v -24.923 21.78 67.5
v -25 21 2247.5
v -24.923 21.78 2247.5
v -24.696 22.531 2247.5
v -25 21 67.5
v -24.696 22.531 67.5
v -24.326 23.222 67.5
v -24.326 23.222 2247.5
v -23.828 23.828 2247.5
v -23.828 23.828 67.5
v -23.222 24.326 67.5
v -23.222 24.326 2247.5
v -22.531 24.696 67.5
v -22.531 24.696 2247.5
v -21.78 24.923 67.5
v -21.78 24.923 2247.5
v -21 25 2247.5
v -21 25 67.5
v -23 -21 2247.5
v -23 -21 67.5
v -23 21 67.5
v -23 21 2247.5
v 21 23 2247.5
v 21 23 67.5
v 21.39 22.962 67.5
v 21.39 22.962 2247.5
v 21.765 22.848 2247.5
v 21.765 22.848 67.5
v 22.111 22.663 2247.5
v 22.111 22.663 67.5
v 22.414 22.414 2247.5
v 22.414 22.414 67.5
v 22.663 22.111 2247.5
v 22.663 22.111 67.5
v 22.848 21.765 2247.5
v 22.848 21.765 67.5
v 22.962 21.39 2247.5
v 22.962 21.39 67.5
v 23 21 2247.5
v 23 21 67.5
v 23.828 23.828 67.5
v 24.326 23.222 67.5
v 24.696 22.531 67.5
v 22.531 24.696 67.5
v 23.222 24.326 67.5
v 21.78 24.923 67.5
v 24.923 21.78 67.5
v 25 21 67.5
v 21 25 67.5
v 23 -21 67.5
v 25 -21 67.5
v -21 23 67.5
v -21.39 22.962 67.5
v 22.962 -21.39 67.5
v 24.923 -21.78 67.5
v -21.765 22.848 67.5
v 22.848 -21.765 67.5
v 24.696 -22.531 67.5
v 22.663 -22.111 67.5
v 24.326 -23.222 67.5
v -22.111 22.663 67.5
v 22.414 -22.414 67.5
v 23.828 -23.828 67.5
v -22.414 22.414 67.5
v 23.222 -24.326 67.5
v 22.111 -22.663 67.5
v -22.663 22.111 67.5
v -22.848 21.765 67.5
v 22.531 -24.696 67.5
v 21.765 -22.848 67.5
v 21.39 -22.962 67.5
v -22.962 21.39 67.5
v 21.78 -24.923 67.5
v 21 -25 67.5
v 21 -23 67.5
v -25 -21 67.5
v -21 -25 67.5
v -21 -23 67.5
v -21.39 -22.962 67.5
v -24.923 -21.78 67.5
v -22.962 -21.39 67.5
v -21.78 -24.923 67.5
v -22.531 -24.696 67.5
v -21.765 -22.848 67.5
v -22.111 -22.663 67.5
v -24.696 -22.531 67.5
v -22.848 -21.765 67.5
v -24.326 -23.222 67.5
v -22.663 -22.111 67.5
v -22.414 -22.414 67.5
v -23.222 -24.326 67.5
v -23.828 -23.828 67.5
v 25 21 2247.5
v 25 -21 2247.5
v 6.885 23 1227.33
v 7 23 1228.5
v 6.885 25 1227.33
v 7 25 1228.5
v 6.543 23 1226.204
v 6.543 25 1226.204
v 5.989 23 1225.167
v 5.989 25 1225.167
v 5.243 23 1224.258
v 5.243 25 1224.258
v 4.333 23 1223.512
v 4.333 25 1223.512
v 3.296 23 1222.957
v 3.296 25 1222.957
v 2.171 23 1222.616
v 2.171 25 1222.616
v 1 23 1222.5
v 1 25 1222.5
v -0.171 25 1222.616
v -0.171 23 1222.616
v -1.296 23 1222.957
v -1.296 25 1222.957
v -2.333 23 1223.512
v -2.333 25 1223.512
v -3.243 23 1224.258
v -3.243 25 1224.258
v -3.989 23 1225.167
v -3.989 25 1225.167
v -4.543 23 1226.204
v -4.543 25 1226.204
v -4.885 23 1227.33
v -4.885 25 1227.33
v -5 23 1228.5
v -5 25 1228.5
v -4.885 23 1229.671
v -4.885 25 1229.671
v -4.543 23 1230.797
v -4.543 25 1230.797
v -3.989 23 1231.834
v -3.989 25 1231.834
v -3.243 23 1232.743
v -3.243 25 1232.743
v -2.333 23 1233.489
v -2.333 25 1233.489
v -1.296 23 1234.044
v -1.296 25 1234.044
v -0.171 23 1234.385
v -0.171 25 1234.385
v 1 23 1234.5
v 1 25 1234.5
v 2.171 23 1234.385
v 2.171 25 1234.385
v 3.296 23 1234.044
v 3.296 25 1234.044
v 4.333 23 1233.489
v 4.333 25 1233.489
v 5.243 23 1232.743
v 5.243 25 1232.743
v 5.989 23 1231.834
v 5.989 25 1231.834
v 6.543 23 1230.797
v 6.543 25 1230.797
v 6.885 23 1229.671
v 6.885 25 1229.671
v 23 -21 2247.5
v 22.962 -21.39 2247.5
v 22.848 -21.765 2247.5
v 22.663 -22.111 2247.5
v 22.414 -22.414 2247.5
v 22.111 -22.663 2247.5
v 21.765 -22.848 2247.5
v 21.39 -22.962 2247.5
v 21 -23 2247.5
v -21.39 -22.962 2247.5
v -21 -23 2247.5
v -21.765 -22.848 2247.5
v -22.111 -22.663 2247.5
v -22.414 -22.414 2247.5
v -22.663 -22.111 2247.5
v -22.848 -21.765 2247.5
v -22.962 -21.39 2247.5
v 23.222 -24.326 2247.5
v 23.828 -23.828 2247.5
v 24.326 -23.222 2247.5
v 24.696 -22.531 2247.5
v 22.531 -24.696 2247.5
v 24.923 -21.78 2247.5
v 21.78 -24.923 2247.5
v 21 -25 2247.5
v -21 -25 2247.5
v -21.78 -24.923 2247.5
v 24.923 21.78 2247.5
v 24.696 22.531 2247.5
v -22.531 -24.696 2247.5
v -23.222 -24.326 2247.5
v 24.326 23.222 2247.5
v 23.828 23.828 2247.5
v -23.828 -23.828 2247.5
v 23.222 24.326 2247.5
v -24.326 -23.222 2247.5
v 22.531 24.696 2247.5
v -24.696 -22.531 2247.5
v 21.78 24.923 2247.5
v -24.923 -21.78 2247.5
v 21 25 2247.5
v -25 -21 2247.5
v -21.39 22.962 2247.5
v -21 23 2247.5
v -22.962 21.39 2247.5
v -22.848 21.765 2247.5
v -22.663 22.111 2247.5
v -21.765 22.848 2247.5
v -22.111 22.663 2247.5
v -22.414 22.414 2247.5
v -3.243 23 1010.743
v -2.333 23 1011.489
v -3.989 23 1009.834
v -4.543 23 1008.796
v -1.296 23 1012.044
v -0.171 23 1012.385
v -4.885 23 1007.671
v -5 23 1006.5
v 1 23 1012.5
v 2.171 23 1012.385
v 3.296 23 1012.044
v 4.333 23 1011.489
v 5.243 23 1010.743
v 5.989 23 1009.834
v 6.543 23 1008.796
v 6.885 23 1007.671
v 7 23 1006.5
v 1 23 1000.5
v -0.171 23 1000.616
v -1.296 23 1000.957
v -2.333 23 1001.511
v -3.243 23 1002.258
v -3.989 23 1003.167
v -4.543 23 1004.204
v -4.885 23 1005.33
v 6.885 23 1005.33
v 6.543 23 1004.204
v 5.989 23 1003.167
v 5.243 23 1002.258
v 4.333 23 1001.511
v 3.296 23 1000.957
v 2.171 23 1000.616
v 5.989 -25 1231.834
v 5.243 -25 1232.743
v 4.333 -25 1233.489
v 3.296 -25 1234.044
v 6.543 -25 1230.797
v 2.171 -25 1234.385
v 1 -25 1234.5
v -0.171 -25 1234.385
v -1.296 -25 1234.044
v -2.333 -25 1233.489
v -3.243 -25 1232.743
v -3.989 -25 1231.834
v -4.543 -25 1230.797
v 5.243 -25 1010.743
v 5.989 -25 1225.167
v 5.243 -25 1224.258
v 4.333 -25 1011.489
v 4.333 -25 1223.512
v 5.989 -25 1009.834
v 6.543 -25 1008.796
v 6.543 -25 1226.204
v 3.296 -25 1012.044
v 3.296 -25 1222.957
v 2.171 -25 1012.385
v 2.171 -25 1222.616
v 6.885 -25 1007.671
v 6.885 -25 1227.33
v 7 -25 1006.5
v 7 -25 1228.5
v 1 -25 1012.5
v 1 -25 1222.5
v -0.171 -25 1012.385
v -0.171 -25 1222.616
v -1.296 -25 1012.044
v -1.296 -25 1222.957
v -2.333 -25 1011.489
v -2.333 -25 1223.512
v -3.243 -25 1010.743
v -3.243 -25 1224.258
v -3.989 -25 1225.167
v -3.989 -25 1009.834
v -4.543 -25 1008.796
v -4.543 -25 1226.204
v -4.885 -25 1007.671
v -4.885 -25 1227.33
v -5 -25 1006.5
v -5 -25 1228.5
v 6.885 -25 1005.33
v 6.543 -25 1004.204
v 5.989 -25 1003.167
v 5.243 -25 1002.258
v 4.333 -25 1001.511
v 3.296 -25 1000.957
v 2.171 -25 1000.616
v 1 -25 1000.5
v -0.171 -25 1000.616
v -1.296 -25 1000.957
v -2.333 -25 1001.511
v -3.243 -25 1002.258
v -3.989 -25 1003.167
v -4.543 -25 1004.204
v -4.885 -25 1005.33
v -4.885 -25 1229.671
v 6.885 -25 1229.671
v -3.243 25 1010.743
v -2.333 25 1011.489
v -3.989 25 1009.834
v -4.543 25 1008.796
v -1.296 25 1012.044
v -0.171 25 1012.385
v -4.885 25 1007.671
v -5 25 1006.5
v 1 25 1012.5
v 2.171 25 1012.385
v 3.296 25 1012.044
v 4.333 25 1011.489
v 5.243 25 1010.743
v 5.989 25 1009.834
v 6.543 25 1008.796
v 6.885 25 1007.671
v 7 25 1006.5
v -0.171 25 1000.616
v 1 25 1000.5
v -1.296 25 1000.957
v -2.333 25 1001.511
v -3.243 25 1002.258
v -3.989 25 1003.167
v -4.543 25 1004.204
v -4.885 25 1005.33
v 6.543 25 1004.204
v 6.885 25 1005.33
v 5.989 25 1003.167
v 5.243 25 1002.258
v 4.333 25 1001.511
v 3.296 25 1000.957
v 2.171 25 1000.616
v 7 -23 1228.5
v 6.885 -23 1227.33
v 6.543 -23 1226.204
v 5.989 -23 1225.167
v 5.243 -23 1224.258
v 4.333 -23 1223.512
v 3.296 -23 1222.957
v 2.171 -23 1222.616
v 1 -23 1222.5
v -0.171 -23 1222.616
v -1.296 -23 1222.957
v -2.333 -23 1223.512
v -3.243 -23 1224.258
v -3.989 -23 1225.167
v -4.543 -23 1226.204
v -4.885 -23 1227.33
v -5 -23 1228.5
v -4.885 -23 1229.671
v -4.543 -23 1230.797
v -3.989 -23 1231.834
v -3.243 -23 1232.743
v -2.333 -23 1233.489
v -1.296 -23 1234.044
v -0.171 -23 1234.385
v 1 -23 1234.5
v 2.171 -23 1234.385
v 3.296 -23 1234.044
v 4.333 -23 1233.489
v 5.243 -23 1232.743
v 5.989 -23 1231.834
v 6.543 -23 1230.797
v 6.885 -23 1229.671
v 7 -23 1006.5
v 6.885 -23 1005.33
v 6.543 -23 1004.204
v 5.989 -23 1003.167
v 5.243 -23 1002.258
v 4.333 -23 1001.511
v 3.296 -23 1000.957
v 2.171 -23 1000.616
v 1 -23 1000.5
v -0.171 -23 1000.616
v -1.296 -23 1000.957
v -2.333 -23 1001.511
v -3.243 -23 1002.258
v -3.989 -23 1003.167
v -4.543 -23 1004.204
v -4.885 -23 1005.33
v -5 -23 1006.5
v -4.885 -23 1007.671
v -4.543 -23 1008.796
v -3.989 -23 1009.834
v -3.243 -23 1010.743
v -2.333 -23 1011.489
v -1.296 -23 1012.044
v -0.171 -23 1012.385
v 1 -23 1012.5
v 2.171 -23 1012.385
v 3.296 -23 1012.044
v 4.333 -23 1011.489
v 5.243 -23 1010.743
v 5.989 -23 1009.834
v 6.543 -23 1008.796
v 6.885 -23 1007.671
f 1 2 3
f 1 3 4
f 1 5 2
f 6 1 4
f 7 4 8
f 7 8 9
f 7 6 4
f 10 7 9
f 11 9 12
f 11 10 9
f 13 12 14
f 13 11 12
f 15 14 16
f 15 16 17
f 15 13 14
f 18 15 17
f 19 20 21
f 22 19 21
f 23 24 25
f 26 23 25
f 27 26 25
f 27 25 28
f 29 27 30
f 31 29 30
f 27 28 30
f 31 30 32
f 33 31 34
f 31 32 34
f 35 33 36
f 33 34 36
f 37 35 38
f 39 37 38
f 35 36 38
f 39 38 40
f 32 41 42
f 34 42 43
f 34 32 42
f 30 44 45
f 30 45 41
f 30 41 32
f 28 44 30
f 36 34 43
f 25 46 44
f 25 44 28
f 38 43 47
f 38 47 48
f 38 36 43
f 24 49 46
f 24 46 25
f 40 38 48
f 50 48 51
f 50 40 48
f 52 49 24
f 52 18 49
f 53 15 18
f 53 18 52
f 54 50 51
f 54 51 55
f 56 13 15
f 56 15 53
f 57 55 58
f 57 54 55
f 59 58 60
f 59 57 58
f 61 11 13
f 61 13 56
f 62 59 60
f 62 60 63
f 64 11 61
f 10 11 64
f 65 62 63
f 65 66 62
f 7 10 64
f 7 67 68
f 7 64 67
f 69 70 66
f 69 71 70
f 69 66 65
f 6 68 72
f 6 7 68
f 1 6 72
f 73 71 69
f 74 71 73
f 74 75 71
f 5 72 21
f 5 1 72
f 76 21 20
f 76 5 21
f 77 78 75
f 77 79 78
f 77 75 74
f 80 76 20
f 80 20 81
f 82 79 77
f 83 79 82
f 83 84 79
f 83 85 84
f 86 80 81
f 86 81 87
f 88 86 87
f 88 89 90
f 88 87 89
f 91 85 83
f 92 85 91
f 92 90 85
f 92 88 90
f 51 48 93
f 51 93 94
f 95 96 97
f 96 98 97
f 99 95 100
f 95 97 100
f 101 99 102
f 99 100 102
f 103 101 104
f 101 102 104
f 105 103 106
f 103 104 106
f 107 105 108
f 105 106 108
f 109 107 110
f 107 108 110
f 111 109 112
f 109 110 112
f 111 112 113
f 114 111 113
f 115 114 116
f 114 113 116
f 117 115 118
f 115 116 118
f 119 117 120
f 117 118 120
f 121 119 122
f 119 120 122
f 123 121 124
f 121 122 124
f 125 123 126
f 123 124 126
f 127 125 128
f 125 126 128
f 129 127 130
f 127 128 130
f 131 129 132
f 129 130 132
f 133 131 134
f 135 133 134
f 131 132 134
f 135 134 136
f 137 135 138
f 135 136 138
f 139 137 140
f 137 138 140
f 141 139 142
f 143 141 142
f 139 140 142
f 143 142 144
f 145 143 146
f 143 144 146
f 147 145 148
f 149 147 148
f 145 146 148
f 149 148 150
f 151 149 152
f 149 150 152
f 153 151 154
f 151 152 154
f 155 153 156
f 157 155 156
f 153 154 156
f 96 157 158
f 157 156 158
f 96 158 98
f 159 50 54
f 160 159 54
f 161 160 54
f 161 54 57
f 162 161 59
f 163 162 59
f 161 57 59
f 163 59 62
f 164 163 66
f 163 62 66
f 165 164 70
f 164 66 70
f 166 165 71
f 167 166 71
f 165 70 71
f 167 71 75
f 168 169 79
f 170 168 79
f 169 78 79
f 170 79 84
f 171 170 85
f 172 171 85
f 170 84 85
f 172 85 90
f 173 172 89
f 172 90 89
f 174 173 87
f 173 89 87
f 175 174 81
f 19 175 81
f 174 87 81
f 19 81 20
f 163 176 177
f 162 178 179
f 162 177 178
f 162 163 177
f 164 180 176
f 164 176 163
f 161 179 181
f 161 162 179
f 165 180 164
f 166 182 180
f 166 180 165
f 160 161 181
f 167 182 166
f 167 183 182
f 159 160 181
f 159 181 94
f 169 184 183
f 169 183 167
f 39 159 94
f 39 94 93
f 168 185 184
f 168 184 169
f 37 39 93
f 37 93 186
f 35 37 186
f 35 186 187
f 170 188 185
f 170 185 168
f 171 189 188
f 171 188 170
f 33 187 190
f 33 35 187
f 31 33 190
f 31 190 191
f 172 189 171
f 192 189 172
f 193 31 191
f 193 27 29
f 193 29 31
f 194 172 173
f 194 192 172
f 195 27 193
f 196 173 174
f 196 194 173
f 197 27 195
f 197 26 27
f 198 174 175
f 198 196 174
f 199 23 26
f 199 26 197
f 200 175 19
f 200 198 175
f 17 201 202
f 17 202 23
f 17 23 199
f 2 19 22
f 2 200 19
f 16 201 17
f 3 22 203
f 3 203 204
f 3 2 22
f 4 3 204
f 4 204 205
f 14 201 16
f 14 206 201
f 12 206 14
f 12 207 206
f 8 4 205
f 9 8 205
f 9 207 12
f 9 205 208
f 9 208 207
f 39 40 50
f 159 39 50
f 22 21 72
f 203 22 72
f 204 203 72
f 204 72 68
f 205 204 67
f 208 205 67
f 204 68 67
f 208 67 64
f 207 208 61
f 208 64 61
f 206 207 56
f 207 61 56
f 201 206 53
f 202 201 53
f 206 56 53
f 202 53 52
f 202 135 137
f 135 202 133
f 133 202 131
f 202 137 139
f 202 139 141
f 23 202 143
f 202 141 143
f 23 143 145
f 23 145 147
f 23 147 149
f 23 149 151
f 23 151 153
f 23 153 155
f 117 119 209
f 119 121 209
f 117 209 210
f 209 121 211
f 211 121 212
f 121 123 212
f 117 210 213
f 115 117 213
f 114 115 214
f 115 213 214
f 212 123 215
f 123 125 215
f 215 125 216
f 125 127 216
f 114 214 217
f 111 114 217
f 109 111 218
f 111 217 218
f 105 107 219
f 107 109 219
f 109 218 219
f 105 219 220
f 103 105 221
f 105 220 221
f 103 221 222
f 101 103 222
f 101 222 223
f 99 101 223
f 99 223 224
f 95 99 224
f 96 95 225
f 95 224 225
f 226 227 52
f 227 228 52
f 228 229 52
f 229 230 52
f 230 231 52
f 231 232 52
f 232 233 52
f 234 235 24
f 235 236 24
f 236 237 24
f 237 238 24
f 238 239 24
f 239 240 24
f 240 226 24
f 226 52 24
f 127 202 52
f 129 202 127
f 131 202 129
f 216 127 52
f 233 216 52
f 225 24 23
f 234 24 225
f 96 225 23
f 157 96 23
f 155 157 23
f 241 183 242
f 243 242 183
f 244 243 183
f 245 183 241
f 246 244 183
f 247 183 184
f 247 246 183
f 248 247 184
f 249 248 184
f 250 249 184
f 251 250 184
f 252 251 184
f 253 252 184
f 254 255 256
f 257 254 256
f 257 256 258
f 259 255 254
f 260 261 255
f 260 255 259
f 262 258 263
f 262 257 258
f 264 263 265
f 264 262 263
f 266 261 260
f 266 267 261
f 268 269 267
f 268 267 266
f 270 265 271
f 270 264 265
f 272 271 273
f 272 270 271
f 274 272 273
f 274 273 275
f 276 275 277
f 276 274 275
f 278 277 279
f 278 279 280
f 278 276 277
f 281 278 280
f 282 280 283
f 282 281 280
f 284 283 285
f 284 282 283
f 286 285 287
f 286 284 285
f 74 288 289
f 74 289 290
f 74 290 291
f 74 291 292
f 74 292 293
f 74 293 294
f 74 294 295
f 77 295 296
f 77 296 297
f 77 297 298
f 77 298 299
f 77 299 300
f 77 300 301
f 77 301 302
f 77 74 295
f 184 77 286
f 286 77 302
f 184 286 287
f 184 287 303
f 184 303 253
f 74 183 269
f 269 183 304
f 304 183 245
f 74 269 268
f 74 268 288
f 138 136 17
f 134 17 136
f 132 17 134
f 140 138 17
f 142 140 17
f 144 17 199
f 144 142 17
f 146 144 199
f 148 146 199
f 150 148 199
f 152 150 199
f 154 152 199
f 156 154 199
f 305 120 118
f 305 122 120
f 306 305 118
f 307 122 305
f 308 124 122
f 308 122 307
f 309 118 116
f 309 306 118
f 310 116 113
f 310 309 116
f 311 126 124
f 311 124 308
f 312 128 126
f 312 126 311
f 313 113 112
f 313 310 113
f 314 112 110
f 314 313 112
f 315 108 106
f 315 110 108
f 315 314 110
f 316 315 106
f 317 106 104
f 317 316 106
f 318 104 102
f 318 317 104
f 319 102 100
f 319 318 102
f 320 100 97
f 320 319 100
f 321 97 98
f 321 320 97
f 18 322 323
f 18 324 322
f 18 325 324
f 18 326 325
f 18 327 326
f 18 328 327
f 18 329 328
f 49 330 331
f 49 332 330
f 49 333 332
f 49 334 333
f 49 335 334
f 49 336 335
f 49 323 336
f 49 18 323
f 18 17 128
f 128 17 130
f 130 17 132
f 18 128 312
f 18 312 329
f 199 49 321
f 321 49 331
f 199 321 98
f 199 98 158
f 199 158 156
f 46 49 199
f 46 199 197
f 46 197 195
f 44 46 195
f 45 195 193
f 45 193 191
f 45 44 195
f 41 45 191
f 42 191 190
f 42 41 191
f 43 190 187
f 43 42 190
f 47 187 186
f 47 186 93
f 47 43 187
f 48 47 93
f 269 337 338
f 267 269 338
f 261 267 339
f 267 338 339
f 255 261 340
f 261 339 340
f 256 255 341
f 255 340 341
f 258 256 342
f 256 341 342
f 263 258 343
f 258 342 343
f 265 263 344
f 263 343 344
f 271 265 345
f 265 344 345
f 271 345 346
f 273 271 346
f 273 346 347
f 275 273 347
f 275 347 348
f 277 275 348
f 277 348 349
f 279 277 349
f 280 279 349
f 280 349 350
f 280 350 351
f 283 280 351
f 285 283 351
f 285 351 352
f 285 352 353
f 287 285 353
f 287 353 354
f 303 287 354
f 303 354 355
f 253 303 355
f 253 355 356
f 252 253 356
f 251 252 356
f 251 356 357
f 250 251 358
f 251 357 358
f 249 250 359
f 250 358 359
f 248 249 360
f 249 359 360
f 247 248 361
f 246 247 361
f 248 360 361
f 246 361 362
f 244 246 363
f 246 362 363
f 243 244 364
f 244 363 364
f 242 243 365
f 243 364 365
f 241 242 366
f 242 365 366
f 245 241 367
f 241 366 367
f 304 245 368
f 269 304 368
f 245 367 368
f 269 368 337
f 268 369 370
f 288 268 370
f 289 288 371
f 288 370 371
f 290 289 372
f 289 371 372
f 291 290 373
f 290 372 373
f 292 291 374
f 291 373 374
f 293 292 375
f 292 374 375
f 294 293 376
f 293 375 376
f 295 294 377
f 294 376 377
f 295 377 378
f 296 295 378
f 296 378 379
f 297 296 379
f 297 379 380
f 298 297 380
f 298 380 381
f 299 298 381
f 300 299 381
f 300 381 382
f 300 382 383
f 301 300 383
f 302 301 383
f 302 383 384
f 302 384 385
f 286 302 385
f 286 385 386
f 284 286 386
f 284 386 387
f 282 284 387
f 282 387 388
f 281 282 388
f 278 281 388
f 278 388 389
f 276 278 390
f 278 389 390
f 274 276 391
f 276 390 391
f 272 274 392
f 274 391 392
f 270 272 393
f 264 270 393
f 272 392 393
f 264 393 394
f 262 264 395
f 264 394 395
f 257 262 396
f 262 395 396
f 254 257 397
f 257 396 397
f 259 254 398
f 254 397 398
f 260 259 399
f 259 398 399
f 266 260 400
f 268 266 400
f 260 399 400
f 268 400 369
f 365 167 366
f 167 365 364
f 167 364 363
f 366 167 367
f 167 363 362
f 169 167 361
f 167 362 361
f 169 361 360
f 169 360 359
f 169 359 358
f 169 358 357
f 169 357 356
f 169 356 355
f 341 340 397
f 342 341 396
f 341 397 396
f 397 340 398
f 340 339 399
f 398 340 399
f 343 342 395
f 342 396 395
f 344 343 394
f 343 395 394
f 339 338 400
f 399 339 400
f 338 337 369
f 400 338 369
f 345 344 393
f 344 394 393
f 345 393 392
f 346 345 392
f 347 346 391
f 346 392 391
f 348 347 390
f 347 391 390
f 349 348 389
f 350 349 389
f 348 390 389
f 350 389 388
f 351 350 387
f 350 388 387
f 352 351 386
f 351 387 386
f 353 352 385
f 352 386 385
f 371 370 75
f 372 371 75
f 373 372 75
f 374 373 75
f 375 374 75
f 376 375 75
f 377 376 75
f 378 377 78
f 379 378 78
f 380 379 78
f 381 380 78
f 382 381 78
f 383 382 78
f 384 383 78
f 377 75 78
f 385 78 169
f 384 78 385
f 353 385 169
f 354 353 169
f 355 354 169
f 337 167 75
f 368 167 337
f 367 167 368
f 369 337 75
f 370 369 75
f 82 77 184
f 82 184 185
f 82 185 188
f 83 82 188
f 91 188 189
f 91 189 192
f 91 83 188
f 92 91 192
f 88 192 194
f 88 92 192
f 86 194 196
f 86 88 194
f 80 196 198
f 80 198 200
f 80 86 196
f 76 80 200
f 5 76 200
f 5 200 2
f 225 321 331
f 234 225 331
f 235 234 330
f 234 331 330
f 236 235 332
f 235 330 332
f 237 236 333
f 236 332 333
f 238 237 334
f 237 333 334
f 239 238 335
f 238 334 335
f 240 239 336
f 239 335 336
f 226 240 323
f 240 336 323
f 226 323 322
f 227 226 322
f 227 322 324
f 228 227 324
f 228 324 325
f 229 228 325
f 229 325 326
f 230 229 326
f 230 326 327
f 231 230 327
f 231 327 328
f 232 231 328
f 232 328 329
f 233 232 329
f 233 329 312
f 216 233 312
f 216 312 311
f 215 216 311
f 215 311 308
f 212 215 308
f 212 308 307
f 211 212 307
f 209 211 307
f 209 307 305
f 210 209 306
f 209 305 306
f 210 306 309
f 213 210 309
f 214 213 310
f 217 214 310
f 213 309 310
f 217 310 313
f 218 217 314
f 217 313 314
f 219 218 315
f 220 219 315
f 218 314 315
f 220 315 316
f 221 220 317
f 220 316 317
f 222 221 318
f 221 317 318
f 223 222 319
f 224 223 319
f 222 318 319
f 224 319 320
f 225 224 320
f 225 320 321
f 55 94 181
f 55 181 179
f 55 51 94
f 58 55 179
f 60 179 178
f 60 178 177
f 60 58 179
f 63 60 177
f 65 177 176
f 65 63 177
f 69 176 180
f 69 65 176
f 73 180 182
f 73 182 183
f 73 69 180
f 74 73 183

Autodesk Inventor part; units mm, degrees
ref_plane "Start Plane" through (0, 0, 67.4996) normal (0, 0, 1) x (1, 0, 0)
ref_plane "End Plane" through (0, 0, 2247.5004) normal (0, 0, 1) x (1, 0, 0)
sketch "Sketch" plane through (0, 0, 0) normal (0, 0, 1) x (1, 0, 0)
  line L0 (-25, -21) -> (-25, 21)
  line L1 (-21, 25) -> (21, 25)
  line L2 (25, 21) -> (25, -21)
  line L3 (21, -25) -> (-21, -25)
  arc A0 (-25, -21) -> (-21, -25) centre (-21, -21) ccw
  arc A1 (25, 21) -> (21, 25) centre (21, 21) ccw
  arc A2 (-21, 25) -> (-25, 21) centre (-21, 21) ccw
  arc A3 (21, -25) -> (25, -21) centre (21, -21) ccw
  arc A4 (-21, 23) -> (-23, 21) centre (-21, 21) ccw
  line L4 (-21, 23) -> (21, 23)
  arc A5 (23, 21) -> (21, 23) centre (21, 21) ccw
  line L5 (23, 21) -> (23, -21)
  arc A6 (21, -23) -> (23, -21) centre (21, -21) ccw
  line L6 (21, -23) -> (-21, -23)
  arc A7 (-23, -21) -> (-21, -23) centre (-21, -21) ccw
  line L7 (-23, -21) -> (-23, 21)
  line L8 (0, 36.1598) -> (0, -36.1598) construction
  line L9 (-36.1598, 0) -> (36.1598, 0) construction
  dimension "d7" = 4
  dimension "d9" = 50
  dimension "d11" = 50
  dimension "d12" = 2
  dimension "d15" = 25
  dimension "d16" = 25
extrude "Body" add sketch "Sketch" along normal up to surface (2180.0008 mm away) from surface at 67.4996
sketch "Sketch3" plane through (0, 0, 0) normal (0, 0, 1) x (1, 0, 0)
  line L0 (0, 0) -> (10, 0)
ref_plane "Work Plane3" through (0, 0, 0) normal (0, -1, 0) x (1, 0, 0)
sketch "Sketch4" plane through (0, 0, 0) normal (0, -1, 0) x (1, 0, 0)
  line L0 (-2, 67.4996) -> (12, 67.4996)
  line L1 (-2, 2247.5004) -> (12, 2247.5004)
  dimension "d18" = 2180.0008
ref_plane "Work Plane4" through (-360.0026, 21, 2287.5) normal (0, 0, 1) x (1, 0, 0)
split "Split1" plane through (-360.0026, 21, 2287.5) removes the side toward (0, 0, 1)
ref_plane "Work Plane5" through (-360.0026, -21, 27.5) normal (0, 0, -1) x (-1, 0, 0)
split "Split2" plane through (-360.0026, -21, 27.5) removes the side toward (0, 0, -1)
sketch "Sketch5" plane through (21, 25, 2247.5004) normal (0, 1, 0) x (1, 0, 0)
  circle A0 centre (-20, 1019) radius 6 projected
  circle A1 centre (-20, 1241.0001) radius 6 projected
  point P0 (-21, 2247.5004)
extrude "Extrusion2" cut sketch "Sketch5" against normal through all
ref_plane "Work Plane6" through (-360.0026, -21, 67.5) normal (0, 0, -1) x (-1, 0, 0)
split "Split3" plane through (-360.0026, -21, 67.5) removes the side toward (0, 0, -1)
ref_plane "Work Plane7" through (-810.0026, 21, 2247.5) normal (0, 0, 1) x (1, 0, 0)
split "Split4" plane through (-810.0026, 21, 2247.5) removes the side toward (0, 0, 1)
equation "\"d7\" = G_IR"
equation "\"d9\" = G_W"
equation "\"d11\" = G_H"
equation "\"d12\" = G_T"
equation "\"d15\" = 0.5 * d9"
equation "\"d16\" = 0.5 * d11"
equation "\"d3\" = G_L"
equation "\"G_W\" = 50"
equation "\"G_H\" = 50"
equation "\"G_T\" = 2"
equation "\"G_IR\" = 4"
equation "\"G_L\" = d18"
equation "\"G_OFFSET_START\" = -67.49959"
equation "\"G_OFFSET_END\" = -67.49962"
equation "\"d13\" = -G_OFFSET_START"
equation "\"d14\" = G_OFFSET_END + B_L"
equation "\"B_L\" = 2315"
properties part number "ISO 10799-2 - 50x50x2 - 2180" material "Steel, Galvanized"
